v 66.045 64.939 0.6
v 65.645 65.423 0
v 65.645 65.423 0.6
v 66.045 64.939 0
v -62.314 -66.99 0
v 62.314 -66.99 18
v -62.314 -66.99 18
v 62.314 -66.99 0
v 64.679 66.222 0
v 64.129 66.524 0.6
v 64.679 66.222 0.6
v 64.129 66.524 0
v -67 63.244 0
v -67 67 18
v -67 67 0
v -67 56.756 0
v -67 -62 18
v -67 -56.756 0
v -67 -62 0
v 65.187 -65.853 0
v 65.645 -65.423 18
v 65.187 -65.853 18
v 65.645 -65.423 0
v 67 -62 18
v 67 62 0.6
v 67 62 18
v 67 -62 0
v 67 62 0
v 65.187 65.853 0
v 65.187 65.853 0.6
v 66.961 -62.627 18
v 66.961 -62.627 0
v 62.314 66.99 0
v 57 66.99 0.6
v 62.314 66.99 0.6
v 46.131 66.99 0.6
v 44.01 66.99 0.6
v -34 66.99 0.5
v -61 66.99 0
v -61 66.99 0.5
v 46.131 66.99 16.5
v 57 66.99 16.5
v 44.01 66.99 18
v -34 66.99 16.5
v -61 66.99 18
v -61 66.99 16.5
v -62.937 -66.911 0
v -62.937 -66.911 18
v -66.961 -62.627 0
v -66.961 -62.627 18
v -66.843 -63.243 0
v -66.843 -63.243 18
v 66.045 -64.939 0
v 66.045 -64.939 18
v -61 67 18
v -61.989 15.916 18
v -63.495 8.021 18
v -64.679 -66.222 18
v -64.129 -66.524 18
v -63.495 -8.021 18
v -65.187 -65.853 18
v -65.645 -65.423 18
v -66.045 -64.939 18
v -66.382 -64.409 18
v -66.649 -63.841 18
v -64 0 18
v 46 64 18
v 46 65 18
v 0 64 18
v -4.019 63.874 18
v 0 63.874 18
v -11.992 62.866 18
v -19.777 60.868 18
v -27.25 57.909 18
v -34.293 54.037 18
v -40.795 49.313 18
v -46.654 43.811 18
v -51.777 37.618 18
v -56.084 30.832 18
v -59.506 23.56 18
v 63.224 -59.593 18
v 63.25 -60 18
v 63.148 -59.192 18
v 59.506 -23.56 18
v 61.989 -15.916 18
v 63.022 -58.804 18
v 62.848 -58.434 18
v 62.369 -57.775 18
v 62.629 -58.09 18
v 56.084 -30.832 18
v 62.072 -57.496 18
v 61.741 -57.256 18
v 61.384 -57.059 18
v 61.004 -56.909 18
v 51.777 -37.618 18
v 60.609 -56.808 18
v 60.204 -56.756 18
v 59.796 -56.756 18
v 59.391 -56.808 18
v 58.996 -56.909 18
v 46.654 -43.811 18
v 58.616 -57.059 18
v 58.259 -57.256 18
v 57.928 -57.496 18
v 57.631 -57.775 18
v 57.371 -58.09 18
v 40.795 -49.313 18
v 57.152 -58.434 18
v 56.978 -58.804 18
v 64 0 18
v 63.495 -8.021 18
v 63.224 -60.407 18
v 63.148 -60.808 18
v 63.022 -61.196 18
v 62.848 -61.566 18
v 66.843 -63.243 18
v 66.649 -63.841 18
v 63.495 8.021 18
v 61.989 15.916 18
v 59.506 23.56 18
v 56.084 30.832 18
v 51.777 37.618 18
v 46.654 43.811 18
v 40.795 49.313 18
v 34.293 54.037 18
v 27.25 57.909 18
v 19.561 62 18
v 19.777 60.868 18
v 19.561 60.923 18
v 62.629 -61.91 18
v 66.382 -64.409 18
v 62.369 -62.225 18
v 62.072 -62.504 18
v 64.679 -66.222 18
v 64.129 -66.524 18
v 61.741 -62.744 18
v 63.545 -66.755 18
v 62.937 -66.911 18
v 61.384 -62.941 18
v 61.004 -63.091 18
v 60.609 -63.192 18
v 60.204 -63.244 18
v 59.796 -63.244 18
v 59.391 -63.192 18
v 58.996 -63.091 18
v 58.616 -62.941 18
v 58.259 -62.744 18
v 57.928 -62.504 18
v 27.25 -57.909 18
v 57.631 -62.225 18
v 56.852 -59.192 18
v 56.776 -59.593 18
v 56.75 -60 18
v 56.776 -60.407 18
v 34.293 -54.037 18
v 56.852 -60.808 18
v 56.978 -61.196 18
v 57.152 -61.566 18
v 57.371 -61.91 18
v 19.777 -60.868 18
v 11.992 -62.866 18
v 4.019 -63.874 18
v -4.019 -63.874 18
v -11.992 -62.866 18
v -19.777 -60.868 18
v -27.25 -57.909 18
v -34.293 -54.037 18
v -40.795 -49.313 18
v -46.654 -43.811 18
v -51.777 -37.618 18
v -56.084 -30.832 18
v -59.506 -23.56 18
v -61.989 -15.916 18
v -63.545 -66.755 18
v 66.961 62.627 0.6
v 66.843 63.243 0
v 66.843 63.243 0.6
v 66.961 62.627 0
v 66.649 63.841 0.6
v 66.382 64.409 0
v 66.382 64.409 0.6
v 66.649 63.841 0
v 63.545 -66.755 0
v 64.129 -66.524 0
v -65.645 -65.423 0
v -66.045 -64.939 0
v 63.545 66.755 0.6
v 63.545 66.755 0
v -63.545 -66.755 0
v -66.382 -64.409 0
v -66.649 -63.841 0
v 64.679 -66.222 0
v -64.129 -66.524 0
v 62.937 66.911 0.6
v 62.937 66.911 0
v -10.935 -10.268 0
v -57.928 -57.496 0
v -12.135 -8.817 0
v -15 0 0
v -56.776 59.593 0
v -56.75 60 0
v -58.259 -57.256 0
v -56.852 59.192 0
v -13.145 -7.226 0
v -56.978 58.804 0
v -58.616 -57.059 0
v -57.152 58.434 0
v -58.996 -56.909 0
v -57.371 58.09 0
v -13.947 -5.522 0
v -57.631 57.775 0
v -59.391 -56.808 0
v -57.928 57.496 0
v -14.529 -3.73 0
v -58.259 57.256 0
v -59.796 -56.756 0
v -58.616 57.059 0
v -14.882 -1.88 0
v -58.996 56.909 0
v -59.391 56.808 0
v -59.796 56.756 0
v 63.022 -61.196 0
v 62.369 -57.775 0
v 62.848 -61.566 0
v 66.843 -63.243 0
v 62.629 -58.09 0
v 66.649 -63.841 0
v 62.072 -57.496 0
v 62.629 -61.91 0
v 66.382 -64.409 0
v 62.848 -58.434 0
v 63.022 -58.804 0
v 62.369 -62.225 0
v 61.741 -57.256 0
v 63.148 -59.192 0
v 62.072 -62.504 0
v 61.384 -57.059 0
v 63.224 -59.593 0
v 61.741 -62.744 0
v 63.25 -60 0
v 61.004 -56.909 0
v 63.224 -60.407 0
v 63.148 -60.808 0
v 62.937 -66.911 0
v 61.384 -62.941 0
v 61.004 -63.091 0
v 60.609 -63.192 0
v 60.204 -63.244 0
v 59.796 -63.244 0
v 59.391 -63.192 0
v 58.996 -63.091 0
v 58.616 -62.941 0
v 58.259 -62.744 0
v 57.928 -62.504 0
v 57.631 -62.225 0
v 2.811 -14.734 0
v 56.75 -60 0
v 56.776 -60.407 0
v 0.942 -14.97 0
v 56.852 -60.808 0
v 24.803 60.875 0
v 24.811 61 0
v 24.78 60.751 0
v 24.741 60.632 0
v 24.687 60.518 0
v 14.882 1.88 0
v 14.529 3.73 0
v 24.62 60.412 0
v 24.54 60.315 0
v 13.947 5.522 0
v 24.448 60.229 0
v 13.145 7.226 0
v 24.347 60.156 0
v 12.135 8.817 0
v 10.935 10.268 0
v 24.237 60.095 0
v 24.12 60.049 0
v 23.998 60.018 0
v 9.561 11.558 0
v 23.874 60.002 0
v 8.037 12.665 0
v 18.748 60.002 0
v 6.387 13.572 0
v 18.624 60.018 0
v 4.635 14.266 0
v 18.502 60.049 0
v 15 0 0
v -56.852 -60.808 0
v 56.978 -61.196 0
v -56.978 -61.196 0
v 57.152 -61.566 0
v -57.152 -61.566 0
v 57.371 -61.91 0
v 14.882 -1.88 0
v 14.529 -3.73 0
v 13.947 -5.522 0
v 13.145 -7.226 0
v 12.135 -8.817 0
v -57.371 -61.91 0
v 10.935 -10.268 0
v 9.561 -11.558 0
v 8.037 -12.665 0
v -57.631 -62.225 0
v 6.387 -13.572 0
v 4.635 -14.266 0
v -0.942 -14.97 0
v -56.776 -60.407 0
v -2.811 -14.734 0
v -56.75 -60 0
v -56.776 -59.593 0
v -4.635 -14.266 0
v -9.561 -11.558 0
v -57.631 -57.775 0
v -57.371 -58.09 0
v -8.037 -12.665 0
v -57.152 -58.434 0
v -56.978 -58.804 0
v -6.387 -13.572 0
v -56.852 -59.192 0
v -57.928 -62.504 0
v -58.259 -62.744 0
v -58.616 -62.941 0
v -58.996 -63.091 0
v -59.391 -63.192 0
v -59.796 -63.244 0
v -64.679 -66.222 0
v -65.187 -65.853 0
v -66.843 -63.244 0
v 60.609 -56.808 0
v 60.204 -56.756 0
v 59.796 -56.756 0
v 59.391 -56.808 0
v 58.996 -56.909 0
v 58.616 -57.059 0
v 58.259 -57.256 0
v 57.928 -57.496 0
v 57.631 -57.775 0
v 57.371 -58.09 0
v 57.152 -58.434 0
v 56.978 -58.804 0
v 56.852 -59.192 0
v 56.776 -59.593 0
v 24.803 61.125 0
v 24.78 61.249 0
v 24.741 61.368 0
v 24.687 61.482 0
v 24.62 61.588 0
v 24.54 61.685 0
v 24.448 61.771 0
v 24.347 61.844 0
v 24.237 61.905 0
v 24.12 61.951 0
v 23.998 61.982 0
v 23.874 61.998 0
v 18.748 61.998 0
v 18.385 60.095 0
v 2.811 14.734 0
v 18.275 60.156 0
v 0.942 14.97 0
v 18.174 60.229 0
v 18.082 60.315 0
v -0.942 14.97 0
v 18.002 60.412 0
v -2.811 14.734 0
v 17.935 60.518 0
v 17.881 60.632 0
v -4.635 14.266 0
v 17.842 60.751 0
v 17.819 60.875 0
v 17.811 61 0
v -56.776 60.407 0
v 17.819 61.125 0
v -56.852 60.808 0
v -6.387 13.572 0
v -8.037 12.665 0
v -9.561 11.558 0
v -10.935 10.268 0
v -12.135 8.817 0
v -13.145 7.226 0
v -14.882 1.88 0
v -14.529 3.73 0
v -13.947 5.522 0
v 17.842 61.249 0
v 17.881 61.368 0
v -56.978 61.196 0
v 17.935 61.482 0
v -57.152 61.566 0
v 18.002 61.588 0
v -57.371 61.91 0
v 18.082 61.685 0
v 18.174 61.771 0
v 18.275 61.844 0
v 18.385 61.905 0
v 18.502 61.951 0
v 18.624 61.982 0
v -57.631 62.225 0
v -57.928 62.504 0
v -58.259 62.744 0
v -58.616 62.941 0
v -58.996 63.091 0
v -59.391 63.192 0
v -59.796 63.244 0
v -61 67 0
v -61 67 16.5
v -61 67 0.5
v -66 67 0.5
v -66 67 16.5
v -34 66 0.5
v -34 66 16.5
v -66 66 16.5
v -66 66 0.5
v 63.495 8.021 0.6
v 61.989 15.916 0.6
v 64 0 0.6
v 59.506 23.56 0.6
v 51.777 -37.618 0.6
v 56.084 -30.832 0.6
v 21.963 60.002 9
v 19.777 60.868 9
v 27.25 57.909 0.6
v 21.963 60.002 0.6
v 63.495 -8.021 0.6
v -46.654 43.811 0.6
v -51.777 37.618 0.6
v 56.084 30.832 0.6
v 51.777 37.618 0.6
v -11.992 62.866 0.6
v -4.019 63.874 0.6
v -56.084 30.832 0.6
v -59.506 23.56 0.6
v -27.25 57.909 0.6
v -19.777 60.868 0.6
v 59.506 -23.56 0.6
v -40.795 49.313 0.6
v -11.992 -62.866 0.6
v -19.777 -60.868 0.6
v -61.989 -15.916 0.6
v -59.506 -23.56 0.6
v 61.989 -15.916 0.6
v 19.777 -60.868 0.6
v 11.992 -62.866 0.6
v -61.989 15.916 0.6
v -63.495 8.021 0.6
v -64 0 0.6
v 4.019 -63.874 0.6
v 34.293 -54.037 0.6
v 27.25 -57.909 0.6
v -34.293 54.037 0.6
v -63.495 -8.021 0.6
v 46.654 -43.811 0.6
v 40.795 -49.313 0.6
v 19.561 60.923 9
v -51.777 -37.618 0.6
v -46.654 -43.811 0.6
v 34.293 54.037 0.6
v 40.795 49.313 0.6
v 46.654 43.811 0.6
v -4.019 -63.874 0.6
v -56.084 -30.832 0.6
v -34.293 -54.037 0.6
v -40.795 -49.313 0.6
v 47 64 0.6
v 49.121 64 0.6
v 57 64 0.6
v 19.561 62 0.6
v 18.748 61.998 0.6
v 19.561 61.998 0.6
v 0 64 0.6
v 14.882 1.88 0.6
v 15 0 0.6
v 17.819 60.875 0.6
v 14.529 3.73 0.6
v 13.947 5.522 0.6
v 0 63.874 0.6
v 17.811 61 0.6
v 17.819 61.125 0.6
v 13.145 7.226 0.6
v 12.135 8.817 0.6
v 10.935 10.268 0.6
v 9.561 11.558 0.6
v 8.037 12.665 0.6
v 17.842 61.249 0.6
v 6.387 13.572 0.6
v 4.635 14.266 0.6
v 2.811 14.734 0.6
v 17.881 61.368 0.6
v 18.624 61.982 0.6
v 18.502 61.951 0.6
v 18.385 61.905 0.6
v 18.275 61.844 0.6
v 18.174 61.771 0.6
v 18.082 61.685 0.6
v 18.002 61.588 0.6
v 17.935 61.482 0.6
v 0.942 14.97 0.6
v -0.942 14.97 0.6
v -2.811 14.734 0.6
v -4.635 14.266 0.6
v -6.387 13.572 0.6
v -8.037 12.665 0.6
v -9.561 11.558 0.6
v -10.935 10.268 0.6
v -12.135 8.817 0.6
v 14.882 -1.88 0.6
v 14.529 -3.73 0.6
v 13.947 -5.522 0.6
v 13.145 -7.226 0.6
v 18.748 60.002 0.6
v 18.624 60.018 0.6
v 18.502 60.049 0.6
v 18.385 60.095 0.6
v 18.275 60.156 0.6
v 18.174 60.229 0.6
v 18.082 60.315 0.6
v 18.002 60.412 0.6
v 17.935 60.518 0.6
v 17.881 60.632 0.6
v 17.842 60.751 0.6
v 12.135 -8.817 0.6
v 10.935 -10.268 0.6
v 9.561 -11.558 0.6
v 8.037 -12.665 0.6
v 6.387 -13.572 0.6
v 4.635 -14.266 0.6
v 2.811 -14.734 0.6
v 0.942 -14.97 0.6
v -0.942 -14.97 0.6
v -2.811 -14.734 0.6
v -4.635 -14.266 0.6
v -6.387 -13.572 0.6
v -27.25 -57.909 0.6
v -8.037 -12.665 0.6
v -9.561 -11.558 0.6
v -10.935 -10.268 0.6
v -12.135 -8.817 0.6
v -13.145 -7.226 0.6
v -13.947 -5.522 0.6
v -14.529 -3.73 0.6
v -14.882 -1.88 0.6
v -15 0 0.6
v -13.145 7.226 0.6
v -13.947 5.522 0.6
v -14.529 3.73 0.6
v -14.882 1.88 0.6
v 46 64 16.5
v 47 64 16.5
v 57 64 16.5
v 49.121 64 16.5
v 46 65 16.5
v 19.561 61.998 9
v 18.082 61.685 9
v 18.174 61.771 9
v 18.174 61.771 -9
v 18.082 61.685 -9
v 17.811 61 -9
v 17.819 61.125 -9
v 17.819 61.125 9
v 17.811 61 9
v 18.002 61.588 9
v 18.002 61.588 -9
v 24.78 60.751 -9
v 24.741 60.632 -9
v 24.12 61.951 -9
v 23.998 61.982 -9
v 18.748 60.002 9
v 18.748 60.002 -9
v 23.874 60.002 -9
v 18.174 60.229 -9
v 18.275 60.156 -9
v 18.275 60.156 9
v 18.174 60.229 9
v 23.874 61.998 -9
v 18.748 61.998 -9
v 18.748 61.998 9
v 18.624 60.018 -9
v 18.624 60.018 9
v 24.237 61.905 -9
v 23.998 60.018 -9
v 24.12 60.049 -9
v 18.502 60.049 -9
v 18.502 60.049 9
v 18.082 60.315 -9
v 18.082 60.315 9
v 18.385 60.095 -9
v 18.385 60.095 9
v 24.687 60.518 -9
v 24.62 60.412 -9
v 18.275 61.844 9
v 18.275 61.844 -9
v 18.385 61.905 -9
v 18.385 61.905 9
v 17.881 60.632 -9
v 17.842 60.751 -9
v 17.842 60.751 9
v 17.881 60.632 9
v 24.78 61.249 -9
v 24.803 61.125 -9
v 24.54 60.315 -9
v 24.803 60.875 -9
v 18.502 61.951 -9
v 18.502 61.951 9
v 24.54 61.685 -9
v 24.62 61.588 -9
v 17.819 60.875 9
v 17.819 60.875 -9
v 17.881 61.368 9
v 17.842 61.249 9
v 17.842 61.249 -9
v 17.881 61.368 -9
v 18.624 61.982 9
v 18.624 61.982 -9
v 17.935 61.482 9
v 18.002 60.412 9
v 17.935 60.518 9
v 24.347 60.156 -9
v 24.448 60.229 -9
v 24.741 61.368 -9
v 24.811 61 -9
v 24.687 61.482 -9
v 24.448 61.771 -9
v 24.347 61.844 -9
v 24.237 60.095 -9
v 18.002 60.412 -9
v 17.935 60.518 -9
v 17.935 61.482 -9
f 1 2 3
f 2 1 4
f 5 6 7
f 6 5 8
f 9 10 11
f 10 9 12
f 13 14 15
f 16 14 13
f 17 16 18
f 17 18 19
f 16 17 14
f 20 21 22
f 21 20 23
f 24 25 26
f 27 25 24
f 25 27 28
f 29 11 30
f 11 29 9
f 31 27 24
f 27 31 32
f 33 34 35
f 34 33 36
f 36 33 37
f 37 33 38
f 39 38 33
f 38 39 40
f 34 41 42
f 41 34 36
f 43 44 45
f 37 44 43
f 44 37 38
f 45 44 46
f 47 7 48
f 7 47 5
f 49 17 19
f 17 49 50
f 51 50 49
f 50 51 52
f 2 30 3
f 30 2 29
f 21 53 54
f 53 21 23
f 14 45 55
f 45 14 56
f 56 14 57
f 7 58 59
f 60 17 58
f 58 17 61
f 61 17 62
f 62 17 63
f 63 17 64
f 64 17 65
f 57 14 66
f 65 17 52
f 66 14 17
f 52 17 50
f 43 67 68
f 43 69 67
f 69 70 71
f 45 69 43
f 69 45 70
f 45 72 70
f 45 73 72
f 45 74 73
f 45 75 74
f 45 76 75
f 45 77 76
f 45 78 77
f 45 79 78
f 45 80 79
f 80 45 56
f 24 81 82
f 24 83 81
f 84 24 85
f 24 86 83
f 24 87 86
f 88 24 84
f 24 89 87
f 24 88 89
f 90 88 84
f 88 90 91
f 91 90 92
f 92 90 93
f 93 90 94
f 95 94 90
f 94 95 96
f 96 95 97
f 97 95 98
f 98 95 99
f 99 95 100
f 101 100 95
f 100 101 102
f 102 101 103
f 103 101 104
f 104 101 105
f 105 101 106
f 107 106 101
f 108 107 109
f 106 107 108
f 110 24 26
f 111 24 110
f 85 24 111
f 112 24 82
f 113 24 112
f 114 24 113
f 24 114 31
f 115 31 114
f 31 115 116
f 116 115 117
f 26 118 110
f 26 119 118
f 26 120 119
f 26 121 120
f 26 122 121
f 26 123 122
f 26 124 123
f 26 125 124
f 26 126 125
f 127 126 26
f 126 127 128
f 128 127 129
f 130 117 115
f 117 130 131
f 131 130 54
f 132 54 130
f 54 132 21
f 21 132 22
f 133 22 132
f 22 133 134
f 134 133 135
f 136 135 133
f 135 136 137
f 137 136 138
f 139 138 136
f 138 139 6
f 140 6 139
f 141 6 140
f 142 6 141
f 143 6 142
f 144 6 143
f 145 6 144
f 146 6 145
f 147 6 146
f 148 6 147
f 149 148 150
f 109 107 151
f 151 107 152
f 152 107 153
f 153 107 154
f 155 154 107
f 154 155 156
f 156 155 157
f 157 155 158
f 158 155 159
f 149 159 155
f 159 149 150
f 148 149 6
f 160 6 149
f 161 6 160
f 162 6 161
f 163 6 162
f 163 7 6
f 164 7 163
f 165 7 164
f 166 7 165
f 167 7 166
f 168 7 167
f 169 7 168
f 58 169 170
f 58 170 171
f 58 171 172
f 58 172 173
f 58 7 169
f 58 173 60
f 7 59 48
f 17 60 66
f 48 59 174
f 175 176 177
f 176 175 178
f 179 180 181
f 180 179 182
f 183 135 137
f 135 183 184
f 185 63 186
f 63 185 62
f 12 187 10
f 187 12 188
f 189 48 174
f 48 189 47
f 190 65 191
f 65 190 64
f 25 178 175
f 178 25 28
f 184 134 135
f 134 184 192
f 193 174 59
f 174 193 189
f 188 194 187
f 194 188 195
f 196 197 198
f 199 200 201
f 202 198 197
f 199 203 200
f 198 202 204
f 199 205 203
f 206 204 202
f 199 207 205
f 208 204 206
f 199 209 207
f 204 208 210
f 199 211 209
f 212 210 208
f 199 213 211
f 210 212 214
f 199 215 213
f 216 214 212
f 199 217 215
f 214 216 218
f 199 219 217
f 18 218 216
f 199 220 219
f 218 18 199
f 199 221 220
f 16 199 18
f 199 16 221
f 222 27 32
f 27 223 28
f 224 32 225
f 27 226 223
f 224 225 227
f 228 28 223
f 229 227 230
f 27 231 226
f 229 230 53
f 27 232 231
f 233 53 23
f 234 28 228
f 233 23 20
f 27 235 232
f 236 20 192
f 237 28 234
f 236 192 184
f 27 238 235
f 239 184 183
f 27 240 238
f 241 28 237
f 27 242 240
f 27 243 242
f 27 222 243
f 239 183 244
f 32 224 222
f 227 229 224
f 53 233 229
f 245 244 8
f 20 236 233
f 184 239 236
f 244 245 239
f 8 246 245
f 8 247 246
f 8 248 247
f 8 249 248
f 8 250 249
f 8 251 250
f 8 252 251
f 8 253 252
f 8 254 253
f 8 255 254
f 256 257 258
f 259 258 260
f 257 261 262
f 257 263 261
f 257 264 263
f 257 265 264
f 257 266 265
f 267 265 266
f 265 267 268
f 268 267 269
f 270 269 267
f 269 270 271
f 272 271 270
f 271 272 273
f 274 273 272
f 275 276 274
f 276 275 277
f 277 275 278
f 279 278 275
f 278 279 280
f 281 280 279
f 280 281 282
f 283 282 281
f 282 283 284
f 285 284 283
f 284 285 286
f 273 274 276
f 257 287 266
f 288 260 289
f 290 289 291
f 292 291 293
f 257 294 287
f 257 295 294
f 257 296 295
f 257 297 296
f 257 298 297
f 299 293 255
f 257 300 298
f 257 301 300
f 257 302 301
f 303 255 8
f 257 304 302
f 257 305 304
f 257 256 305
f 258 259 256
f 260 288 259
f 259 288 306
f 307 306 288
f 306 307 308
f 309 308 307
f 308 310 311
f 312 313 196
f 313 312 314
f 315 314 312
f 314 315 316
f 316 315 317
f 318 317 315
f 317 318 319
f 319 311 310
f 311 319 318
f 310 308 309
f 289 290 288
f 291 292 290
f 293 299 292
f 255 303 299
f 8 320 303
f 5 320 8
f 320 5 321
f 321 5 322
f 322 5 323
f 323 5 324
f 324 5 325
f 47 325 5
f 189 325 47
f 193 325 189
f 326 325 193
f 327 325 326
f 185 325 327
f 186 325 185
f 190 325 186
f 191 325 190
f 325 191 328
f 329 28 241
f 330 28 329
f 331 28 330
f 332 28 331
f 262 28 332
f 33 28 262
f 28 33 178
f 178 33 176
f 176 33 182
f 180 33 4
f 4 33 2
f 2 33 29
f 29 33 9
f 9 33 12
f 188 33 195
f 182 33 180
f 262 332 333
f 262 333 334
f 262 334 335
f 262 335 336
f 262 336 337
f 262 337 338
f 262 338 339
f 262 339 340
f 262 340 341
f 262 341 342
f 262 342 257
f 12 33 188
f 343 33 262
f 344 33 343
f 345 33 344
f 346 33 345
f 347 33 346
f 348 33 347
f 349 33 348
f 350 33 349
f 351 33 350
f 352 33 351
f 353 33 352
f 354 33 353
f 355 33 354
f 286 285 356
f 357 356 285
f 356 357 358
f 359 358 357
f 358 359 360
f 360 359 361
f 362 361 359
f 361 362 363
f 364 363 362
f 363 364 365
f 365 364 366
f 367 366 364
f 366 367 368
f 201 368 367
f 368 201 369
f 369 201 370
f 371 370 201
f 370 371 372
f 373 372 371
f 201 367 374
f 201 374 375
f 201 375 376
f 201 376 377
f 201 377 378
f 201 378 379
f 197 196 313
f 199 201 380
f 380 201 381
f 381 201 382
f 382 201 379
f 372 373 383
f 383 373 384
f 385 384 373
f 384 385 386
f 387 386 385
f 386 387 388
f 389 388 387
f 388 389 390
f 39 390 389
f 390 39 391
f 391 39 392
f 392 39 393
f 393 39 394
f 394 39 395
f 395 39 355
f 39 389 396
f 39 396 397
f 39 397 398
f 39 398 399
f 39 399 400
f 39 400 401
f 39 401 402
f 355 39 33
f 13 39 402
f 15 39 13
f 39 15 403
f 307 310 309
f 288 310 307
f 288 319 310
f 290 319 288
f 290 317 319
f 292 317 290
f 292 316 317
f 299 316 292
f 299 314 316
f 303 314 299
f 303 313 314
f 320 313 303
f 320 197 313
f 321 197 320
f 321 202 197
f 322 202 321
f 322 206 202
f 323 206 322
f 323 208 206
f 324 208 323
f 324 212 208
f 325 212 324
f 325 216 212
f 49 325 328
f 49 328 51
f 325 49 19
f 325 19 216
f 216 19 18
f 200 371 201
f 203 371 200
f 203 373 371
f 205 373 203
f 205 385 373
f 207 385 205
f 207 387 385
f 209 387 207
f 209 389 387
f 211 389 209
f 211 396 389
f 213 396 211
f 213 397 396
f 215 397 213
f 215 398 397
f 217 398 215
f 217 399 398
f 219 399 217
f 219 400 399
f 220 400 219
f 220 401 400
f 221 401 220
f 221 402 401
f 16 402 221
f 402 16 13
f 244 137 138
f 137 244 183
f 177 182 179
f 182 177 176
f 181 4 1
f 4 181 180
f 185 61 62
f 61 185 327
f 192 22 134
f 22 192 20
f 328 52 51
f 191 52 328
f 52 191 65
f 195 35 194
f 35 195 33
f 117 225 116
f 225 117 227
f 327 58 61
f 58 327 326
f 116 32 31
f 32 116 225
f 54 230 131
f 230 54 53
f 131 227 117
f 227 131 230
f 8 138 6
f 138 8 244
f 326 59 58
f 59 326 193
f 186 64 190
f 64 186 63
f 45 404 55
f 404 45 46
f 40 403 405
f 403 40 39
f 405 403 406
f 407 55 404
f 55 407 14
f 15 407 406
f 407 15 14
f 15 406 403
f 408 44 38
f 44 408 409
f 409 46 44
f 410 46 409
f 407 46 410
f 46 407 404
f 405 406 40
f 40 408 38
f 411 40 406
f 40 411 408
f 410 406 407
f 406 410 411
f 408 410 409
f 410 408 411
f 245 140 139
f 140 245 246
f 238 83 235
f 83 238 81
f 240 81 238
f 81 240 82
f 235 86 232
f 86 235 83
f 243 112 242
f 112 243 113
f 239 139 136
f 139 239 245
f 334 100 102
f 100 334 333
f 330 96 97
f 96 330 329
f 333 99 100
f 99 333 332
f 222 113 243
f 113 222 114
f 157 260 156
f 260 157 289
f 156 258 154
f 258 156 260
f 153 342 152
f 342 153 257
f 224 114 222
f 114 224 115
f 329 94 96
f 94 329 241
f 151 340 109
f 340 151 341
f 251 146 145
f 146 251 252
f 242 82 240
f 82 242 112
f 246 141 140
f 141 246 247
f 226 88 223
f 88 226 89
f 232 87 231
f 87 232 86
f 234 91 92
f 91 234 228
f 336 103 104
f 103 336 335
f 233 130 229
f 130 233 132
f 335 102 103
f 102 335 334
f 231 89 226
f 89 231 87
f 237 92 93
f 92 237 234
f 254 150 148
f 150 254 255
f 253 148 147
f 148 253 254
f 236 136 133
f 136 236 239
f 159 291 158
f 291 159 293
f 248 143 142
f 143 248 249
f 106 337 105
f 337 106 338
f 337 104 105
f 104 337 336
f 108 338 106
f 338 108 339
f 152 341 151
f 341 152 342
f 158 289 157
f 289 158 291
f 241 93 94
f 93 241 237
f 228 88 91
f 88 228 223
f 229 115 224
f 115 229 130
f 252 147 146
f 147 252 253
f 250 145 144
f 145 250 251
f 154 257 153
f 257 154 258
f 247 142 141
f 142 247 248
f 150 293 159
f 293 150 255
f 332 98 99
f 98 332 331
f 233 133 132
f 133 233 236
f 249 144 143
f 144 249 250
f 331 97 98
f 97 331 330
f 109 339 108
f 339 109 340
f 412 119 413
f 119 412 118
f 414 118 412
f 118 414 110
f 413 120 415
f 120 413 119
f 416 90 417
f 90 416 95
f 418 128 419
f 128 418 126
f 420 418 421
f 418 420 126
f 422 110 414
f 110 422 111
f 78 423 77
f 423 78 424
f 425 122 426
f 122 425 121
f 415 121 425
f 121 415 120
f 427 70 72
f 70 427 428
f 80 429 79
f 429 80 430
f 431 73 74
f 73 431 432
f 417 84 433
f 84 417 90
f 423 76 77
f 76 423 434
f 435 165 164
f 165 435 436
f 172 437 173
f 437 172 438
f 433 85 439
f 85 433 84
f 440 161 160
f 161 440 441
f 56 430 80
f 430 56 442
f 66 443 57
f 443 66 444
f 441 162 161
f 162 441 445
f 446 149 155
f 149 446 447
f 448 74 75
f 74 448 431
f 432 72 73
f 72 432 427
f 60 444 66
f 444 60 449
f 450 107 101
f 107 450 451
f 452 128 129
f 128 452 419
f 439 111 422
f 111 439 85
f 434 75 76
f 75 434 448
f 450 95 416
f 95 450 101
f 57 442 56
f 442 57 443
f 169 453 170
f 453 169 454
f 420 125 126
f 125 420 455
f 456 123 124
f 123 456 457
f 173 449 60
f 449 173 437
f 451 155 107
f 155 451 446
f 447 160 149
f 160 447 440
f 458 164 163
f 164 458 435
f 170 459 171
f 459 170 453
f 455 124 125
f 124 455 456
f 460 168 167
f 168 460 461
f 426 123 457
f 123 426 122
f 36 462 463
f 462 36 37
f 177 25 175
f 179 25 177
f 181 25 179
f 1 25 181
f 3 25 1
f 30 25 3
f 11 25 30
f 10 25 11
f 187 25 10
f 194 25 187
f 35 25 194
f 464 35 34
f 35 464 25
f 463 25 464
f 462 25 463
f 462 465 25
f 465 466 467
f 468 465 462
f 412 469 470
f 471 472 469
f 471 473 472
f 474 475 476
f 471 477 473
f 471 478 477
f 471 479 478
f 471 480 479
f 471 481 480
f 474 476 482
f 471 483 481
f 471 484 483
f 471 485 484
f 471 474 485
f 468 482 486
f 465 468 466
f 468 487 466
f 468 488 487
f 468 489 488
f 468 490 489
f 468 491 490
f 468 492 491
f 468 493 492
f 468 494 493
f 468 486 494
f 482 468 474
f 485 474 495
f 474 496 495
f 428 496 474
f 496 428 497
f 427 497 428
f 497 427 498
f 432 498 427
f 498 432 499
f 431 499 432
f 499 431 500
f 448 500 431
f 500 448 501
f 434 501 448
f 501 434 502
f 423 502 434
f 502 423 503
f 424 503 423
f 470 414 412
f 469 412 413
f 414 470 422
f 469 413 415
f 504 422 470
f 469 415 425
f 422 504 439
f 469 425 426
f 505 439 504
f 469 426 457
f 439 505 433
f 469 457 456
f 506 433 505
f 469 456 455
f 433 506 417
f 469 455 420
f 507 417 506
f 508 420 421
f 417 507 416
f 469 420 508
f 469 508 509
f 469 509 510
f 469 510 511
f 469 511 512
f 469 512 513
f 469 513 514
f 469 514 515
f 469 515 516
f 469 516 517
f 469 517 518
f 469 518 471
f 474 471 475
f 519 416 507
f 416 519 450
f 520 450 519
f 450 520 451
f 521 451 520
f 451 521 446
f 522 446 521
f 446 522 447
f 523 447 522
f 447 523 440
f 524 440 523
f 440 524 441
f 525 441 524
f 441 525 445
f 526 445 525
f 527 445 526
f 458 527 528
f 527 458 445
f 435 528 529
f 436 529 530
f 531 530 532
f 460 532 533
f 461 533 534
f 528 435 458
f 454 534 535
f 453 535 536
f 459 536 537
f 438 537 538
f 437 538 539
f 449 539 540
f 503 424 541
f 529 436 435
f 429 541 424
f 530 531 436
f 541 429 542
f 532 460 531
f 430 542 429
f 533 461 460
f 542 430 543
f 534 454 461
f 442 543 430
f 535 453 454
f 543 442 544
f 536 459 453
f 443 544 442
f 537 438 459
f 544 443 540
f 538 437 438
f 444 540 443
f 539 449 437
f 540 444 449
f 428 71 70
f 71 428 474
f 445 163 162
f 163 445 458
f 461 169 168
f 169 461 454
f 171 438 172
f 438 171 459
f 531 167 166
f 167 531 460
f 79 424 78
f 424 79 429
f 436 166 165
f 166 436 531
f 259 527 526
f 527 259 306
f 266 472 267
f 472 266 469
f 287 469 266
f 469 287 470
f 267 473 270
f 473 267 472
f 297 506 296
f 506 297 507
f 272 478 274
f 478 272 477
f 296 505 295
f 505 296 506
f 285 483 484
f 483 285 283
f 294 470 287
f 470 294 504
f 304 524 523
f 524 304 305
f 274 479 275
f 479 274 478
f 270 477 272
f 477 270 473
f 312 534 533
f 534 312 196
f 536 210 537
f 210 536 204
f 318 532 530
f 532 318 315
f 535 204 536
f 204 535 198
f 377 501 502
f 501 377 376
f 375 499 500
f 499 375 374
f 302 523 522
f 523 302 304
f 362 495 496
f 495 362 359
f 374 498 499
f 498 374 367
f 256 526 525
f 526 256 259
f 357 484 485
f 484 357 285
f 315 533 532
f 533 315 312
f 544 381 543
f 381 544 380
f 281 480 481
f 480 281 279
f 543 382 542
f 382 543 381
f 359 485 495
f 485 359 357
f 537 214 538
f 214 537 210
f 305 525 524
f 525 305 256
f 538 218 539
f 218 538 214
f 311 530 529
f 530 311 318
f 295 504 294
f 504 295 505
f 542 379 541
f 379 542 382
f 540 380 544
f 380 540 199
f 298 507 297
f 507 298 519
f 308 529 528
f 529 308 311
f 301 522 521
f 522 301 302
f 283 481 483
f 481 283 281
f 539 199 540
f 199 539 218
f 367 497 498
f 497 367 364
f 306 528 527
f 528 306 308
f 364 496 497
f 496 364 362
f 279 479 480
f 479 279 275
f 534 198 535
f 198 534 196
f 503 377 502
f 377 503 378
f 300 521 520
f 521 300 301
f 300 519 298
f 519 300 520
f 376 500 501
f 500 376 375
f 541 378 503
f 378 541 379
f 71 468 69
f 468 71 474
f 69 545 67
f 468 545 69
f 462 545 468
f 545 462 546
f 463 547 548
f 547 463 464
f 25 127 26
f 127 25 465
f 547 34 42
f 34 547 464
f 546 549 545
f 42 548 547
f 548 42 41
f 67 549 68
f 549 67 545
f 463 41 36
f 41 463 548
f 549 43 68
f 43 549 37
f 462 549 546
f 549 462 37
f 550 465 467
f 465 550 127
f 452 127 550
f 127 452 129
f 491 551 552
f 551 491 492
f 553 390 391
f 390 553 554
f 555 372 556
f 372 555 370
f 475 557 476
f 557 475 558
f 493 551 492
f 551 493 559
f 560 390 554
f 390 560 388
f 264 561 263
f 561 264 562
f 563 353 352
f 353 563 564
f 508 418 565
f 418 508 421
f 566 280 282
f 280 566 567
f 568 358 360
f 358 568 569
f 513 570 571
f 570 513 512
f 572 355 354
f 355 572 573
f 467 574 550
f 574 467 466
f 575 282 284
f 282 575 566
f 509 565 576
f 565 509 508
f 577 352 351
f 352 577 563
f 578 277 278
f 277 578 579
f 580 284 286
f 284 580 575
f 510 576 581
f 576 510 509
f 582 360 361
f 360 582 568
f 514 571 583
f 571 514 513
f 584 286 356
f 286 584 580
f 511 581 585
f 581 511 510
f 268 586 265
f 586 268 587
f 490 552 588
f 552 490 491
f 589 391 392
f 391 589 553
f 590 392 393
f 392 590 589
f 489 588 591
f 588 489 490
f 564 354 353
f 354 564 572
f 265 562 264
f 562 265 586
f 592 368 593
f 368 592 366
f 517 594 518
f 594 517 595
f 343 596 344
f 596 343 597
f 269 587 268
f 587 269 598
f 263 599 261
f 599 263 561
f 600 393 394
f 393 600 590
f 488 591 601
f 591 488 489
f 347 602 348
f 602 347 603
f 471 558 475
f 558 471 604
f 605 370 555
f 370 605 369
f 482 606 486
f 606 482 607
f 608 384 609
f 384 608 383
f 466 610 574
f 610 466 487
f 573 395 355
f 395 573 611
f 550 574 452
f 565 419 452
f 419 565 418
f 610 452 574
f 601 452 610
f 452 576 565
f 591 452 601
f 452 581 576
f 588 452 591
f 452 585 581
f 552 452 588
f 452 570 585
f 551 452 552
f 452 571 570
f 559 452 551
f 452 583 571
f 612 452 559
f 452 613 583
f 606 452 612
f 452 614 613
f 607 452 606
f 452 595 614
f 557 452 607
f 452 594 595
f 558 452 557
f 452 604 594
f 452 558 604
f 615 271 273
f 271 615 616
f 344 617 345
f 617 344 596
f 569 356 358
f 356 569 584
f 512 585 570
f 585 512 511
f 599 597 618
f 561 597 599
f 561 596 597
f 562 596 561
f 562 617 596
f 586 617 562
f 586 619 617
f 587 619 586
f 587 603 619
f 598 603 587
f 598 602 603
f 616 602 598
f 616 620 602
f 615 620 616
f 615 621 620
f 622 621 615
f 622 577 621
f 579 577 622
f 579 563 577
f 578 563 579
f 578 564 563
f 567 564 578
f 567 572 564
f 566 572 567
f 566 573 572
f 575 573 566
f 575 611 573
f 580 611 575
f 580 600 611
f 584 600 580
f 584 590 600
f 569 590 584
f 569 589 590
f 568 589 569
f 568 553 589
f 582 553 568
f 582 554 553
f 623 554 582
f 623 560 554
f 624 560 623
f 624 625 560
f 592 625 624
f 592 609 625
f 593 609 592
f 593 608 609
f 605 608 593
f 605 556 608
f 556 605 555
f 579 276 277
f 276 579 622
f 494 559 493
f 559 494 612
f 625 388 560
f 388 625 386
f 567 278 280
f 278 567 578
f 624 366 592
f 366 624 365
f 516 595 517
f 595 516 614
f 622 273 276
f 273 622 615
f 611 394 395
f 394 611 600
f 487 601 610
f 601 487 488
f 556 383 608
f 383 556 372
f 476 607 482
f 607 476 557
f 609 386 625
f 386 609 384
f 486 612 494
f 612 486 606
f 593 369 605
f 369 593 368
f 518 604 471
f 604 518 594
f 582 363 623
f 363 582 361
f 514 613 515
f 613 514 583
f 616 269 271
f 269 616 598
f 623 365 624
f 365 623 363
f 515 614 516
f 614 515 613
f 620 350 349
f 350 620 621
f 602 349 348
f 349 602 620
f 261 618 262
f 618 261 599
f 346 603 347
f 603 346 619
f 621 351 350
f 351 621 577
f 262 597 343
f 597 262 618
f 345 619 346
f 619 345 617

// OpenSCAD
$fn = 50;


union() {
	difference() {
		union() {
			hull() {
				translate(v = [-62.0000000000, 62.0000000000, 0]) {
					cylinder(h = 18, r = 5);
				}
				translate(v = [62.0000000000, 62.0000000000, 0]) {
					cylinder(h = 18, r = 5);
				}
				translate(v = [-62.0000000000, -62.0000000000, 0]) {
					cylinder(h = 18, r = 5);
				}
				translate(v = [62.0000000000, -62.0000000000, 0]) {
					cylinder(h = 18, r = 5);
				}
			}
			translate(v = [-67.0000000000, 61.0000000000, 0]) {
				cube(size = [6, 6, 18]);
			}
		}
		union() {
			translate(v = [-67.5000000000, -60.0000000000, -250.0000000000]) {
				rotate(a = [0, 0, 0]) {
					difference() {
						union() {
							hull() {
								translate(v = [7.5000000000, 0, 0]) {
									cylinder(h = 250, r = 3.2500000000, r1 = 3.2500000000, r2 = 3.2500000000);
								}
								translate(v = [-7.5000000000, 0, 0]) {
									cylinder(h = 250, r = 3.2500000000, r1 = 3.2500000000, r2 = 3.2500000000);
								}
							}
						}
						union();
					}
				}
			}
			translate(v = [-67.5000000000, 60.0000000000, -250.0000000000]) {
				rotate(a = [0, 0, 0]) {
					difference() {
						union() {
							hull() {
								translate(v = [7.5000000000, 0, 0]) {
									cylinder(h = 250, r = 3.2500000000, r1 = 3.2500000000, r2 = 3.2500000000);
								}
								translate(v = [-7.5000000000, 0, 0]) {
									cylinder(h = 250, r = 3.2500000000, r1 = 3.2500000000, r2 = 3.2500000000);
								}
							}
						}
						union();
					}
				}
			}
			translate(v = [-66.0000000000, 66.0000000000, 0.5000000000]) {
				cube(size = [32, 1, 16]);
			}
			translate(v = [60.0000000000, -60.0000000000, 0]) {
				cylinder(h = 100, r = 3.2500000000);
			}
			translate(v = [0, 0, 0.6000000000]) {
				cylinder(h = 20.4000000000, r = 64.0000000000);
			}
			translate(v = [0, 0, -9.0000000000]) {
				cylinder(h = 18, r = 15.0000000000);
			}
			translate(v = [0.0000000000, 62.0000000000, 0.6000000000]) {
				cube(size = [67.0000000000, 2, 20.4000000000]);
			}
			translate(v = [57.0000000000, 62.0000000000, 0.6000000000]) {
				cube(size = [10, 5, 20.4000000000]);
			}
			translate(v = [46.0000000000, 62.0000000000, 16.5000000000]) {
				cube(size = [21, 5, 1.5000000000]);
			}
			translate(v = [43.2500000000, 67.7500000000, 0.6000000000]) {
				rotate(a = [0, 0, -45]) {
					cube(size = [7.5000000000, 1.5000000000, 20.4000000000]);
				}
			}
			translate(v = [12.0610000000, 60.0000000000, 0.6000000000]) {
				cube(size = [7.5000000000, 2, 17.4000000000]);
			}
		}
	}
	union() {
		translate(v = [21.3110000000, 61.0000000000, -9.0000000000]) {
			rotate(a = [0, 0, 0]) {
				difference() {
					union() {
						#hull() {
							#translate(v = [2.5000000000, 0, 0]) {
								cylinder(h = 18, r = 1.0000000000, r1 = 1.0000000000, r2 = 1.0000000000);
							}
							#translate(v = [-2.5000000000, 0, 0]) {
								cylinder(h = 18, r = 1.0000000000, r1 = 1.0000000000, r2 = 1.0000000000);
							}
						}
					}
					union();
				}
			}
		}
	}
}
